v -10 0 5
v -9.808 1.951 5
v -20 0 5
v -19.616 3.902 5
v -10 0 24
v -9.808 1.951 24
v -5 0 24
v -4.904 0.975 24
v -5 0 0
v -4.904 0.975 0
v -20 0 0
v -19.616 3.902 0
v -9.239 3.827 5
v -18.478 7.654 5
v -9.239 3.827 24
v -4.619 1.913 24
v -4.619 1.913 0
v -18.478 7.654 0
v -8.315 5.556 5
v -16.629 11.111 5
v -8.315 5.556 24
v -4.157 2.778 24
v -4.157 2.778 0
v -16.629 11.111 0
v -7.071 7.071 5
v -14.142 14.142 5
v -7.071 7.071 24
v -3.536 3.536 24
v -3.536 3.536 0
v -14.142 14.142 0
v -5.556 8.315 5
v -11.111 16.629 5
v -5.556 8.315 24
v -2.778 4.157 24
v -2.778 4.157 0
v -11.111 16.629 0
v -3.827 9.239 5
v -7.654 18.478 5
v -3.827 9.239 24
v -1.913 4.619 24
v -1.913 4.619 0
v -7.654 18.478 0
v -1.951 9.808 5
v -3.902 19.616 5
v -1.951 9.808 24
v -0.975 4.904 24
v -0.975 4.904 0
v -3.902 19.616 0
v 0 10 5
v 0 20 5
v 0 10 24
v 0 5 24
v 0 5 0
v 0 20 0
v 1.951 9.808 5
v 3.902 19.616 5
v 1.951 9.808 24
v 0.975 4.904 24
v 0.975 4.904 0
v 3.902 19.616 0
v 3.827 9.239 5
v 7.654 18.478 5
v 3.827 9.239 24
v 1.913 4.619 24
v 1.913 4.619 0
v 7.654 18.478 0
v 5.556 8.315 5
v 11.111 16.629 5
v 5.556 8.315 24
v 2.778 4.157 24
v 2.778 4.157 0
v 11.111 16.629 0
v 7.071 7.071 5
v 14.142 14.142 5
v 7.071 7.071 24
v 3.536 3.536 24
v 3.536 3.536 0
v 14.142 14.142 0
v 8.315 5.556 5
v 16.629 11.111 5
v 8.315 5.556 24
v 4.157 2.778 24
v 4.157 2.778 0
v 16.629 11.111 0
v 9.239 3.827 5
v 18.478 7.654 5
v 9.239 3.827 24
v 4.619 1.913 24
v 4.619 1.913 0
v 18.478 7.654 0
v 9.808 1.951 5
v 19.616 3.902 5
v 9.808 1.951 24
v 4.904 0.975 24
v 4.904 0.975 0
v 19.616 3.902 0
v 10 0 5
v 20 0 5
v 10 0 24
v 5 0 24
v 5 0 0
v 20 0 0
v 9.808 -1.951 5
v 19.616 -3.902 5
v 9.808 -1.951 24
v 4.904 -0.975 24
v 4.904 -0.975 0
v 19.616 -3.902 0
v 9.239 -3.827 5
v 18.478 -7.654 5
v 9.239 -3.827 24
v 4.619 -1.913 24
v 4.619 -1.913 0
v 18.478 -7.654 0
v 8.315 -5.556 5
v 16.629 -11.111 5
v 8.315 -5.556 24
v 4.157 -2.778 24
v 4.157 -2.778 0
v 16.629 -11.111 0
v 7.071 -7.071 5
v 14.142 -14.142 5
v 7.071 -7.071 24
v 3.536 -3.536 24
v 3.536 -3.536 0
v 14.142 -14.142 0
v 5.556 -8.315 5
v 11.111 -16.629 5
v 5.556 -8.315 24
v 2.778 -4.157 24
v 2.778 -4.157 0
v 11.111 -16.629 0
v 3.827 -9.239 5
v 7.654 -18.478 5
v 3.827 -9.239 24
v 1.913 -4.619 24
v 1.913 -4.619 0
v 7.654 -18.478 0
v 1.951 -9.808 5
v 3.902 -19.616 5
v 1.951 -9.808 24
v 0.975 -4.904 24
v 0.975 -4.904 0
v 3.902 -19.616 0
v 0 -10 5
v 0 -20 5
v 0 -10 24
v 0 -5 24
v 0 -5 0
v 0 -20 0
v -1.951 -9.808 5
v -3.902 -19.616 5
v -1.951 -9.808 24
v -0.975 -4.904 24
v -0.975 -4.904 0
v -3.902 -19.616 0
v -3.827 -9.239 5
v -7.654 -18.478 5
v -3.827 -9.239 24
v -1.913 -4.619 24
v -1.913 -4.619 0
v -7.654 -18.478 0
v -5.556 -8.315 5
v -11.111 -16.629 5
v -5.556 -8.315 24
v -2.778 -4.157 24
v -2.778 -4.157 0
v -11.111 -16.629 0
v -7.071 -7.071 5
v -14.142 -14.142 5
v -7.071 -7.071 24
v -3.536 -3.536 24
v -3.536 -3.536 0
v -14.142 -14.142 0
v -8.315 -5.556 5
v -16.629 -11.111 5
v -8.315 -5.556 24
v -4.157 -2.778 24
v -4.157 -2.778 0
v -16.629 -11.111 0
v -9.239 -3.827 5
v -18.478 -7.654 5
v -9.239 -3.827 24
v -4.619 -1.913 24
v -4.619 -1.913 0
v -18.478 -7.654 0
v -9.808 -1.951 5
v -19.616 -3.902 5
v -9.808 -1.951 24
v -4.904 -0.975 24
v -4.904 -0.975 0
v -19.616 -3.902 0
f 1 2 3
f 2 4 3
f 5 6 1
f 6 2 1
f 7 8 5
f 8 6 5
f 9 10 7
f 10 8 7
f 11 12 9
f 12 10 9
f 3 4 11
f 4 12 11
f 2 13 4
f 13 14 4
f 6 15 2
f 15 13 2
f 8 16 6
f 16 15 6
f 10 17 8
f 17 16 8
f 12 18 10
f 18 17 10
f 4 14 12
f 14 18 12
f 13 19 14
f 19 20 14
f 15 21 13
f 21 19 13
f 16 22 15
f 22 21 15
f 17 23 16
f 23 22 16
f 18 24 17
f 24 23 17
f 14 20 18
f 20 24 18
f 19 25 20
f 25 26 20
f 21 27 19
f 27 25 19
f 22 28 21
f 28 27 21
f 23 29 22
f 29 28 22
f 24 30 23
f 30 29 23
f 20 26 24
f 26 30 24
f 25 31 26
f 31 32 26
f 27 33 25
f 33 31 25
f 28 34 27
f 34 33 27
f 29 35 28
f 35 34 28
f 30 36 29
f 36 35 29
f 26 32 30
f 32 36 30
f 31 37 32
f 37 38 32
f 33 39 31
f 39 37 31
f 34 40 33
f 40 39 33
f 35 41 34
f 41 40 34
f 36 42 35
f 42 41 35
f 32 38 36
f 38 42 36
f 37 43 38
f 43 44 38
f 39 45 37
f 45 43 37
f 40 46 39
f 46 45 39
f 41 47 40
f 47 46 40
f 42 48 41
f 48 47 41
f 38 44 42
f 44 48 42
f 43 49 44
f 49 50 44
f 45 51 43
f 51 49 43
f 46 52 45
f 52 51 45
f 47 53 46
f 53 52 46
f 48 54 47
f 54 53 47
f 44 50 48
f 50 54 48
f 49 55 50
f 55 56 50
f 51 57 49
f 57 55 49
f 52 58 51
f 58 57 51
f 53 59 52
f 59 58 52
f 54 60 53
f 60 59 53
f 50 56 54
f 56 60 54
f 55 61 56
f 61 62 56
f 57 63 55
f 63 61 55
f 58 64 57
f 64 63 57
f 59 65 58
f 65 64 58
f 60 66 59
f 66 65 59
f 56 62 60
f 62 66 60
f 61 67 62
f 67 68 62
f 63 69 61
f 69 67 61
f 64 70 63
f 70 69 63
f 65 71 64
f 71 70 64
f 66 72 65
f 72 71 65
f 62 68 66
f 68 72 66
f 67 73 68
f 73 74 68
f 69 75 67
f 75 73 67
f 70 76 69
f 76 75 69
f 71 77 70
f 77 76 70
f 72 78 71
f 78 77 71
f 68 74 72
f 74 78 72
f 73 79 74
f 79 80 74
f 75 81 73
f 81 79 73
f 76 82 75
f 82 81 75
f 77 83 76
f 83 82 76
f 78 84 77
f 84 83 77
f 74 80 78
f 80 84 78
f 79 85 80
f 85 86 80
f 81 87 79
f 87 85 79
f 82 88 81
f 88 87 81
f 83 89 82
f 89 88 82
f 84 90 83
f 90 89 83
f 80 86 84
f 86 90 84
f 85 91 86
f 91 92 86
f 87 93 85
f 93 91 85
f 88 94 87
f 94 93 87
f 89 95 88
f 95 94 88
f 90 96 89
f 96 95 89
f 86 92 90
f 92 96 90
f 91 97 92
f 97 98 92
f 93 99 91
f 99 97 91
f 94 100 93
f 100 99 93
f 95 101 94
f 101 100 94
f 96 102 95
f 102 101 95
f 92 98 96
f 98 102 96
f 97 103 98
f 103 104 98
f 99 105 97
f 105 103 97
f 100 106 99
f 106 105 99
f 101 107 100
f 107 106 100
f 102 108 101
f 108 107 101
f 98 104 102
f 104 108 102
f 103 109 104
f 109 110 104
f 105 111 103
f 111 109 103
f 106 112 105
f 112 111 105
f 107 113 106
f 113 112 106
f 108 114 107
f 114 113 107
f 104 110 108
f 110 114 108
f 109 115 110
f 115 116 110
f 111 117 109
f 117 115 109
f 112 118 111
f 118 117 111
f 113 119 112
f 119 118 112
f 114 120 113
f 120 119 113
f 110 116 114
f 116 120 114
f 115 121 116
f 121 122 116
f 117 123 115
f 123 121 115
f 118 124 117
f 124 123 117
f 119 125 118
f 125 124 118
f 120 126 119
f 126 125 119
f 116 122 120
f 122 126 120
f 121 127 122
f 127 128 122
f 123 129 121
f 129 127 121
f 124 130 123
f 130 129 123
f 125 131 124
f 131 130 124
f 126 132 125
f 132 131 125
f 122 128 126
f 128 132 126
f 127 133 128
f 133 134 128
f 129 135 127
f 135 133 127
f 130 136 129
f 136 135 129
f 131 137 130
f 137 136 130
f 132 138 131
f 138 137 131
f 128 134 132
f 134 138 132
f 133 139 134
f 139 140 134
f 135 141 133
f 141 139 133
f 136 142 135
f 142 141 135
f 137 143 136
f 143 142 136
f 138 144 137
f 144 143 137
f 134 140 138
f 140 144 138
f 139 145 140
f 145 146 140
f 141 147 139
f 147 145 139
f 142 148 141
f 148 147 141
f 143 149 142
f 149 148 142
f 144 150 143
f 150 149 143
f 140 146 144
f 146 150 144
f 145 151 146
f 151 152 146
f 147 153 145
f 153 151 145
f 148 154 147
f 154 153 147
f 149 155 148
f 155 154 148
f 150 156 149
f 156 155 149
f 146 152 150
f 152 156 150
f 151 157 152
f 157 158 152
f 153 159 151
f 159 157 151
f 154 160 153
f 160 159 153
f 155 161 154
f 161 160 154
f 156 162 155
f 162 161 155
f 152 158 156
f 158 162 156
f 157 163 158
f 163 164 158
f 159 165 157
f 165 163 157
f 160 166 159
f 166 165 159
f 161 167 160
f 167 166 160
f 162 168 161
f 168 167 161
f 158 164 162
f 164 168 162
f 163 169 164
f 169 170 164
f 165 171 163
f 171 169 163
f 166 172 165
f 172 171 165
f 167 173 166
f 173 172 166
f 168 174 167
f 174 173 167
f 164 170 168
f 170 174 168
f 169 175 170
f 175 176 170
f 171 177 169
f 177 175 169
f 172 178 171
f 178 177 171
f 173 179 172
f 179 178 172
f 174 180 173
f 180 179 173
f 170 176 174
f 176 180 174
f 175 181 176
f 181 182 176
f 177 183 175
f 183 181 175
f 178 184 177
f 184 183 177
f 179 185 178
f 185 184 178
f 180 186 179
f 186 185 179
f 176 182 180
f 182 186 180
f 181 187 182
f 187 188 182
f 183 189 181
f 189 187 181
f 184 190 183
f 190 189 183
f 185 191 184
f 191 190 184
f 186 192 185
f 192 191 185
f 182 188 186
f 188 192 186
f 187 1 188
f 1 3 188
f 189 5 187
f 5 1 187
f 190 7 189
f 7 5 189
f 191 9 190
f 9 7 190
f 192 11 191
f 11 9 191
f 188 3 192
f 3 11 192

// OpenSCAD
$fn = 32;

// ----------------------------------------------------------------------
// Revolved part: flanged bushing R20
// ----------------------------------------------------------------------

// --- parameters (mm) ---
bore_r = 5;               // bore radius
flange_r = 20;            // flange radius
flange_h = 5;             // flange thickness
sleeve_r = 10;            // sleeve radius
total_h = 24;             // overall height
revolve_angle = 360;      // revolve sweep, degrees

bore_d = 2 * bore_r;
flange_d = 2 * flange_r;
sleeve_d = 2 * sleeve_r;

profile = [[5, 0], [20, 0], [20, 5], [10, 5], [10, 24], [5, 24]];  // primary outline, 6 points, counter clockwise

// --- the one profile operation ---
rotate_extrude(angle = revolve_angle) polygon(points = profile);
